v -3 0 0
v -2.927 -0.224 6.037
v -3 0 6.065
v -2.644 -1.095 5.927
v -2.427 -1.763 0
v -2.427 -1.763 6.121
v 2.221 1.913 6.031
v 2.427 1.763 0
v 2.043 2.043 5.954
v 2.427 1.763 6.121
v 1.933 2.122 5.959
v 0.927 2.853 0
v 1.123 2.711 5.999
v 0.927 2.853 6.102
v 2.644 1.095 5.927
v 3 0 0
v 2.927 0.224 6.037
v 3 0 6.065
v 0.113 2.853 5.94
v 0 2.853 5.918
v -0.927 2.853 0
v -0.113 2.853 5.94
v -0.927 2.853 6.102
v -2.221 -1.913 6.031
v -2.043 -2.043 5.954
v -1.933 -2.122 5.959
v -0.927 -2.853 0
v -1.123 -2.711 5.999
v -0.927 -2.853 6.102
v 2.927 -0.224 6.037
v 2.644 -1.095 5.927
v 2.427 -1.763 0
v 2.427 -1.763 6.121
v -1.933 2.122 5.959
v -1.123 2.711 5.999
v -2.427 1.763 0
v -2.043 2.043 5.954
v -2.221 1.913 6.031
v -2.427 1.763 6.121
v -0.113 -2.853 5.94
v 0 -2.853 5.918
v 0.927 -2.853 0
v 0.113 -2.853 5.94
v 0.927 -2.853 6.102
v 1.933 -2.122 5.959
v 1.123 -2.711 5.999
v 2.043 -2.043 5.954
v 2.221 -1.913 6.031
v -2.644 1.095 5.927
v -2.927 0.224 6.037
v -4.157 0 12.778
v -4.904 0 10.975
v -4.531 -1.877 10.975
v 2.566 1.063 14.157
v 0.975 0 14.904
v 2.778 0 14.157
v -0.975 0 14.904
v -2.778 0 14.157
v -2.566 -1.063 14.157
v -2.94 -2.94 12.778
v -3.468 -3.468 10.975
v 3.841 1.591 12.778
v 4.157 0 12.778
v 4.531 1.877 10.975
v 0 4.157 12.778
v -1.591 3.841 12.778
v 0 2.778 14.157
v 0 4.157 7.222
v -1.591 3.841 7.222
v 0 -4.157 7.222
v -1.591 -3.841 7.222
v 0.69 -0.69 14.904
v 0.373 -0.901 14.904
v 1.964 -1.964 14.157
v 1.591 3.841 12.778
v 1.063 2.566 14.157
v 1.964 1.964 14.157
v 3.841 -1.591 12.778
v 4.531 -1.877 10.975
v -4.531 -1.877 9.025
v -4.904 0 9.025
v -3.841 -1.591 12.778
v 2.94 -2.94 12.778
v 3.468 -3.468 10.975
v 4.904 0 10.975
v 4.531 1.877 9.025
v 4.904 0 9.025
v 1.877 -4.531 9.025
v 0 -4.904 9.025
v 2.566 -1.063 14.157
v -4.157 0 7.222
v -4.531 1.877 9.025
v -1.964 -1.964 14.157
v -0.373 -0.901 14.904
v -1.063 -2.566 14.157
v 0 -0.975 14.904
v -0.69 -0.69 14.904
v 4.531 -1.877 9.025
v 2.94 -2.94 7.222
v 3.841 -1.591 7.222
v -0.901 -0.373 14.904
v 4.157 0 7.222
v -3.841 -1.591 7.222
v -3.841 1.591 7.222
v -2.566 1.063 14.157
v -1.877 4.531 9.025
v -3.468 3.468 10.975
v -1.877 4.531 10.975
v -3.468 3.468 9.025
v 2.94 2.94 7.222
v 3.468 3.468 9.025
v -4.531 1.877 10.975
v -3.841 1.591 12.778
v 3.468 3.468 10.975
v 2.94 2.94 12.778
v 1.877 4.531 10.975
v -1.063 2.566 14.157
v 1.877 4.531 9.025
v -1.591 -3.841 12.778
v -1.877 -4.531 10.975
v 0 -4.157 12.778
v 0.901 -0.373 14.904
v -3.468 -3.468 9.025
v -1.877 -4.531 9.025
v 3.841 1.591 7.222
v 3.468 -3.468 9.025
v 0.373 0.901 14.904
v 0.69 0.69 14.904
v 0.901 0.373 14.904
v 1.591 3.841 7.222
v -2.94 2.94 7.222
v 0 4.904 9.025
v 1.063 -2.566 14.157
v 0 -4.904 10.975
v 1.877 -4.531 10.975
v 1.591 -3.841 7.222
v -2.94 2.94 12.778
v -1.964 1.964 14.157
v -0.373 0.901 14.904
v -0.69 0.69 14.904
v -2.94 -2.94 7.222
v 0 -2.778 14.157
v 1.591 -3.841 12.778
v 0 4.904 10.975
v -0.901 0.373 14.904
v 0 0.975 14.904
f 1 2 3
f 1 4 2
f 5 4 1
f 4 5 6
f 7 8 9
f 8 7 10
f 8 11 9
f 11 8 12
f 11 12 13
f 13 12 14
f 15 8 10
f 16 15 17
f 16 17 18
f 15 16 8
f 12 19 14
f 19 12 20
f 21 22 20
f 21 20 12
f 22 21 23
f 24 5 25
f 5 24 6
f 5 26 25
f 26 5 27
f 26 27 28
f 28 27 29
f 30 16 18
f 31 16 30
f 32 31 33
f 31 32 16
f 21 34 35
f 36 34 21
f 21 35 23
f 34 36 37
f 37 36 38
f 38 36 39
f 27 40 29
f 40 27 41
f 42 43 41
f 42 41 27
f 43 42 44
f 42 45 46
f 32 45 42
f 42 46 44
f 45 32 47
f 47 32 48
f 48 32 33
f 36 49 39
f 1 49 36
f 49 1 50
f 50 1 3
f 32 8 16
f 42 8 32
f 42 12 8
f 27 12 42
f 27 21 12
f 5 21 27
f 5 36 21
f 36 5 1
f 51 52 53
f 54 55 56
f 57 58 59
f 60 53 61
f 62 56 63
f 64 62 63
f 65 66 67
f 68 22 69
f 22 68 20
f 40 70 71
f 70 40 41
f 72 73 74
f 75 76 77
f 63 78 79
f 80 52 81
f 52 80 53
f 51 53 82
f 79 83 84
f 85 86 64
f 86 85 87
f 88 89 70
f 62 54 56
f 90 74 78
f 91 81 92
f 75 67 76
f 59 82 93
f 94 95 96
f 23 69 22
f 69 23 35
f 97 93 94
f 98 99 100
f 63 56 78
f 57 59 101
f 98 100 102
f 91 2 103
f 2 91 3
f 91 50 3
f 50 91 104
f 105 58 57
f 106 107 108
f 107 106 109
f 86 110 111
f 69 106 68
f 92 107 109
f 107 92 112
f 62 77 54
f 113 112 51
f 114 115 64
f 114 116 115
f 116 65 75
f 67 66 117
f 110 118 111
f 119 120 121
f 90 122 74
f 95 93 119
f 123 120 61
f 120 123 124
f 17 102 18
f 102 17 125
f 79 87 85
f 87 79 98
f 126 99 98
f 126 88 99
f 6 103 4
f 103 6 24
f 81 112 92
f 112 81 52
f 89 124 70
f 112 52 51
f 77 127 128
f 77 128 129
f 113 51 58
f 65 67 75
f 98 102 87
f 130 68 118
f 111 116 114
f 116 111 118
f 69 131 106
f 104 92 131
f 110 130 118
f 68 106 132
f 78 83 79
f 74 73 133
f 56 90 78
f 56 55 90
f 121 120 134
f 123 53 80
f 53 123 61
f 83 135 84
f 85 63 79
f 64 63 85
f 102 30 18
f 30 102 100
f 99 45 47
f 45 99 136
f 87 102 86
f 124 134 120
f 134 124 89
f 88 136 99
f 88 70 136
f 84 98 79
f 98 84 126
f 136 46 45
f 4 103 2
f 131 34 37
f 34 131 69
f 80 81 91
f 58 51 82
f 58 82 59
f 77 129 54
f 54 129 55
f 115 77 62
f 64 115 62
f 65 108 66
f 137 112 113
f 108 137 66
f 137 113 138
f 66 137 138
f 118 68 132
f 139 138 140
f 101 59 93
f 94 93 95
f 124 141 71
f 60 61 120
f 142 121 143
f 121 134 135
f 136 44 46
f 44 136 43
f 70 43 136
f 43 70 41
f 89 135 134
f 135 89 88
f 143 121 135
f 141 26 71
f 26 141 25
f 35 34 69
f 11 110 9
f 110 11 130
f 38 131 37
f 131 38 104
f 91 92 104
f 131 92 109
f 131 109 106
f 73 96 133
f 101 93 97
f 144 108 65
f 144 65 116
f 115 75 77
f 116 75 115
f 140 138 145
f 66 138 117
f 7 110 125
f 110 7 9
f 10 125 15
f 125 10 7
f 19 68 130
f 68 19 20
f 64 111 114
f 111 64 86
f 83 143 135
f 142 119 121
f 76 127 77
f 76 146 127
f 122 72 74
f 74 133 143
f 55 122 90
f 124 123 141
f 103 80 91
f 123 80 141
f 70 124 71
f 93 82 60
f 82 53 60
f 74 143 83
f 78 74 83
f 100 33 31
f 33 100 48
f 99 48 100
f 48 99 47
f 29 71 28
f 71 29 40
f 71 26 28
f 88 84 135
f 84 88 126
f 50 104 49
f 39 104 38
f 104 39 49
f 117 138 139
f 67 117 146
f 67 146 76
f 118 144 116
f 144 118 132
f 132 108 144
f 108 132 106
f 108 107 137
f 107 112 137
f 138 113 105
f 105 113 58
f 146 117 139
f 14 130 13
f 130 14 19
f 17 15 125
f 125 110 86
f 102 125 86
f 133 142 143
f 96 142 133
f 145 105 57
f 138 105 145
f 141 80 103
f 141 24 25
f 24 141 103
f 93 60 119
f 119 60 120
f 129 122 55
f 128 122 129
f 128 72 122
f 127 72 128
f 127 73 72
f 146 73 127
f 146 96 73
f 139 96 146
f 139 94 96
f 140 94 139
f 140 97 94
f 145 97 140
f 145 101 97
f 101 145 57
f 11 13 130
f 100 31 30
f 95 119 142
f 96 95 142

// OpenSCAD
// The exact-geometry audit's case x06 (docs/audits/exact-geometry-rust.md).
// volume: 678.5840131753953
union() { cylinder(r=3, h=10); translate([0,0,10]) sphere(5); }
